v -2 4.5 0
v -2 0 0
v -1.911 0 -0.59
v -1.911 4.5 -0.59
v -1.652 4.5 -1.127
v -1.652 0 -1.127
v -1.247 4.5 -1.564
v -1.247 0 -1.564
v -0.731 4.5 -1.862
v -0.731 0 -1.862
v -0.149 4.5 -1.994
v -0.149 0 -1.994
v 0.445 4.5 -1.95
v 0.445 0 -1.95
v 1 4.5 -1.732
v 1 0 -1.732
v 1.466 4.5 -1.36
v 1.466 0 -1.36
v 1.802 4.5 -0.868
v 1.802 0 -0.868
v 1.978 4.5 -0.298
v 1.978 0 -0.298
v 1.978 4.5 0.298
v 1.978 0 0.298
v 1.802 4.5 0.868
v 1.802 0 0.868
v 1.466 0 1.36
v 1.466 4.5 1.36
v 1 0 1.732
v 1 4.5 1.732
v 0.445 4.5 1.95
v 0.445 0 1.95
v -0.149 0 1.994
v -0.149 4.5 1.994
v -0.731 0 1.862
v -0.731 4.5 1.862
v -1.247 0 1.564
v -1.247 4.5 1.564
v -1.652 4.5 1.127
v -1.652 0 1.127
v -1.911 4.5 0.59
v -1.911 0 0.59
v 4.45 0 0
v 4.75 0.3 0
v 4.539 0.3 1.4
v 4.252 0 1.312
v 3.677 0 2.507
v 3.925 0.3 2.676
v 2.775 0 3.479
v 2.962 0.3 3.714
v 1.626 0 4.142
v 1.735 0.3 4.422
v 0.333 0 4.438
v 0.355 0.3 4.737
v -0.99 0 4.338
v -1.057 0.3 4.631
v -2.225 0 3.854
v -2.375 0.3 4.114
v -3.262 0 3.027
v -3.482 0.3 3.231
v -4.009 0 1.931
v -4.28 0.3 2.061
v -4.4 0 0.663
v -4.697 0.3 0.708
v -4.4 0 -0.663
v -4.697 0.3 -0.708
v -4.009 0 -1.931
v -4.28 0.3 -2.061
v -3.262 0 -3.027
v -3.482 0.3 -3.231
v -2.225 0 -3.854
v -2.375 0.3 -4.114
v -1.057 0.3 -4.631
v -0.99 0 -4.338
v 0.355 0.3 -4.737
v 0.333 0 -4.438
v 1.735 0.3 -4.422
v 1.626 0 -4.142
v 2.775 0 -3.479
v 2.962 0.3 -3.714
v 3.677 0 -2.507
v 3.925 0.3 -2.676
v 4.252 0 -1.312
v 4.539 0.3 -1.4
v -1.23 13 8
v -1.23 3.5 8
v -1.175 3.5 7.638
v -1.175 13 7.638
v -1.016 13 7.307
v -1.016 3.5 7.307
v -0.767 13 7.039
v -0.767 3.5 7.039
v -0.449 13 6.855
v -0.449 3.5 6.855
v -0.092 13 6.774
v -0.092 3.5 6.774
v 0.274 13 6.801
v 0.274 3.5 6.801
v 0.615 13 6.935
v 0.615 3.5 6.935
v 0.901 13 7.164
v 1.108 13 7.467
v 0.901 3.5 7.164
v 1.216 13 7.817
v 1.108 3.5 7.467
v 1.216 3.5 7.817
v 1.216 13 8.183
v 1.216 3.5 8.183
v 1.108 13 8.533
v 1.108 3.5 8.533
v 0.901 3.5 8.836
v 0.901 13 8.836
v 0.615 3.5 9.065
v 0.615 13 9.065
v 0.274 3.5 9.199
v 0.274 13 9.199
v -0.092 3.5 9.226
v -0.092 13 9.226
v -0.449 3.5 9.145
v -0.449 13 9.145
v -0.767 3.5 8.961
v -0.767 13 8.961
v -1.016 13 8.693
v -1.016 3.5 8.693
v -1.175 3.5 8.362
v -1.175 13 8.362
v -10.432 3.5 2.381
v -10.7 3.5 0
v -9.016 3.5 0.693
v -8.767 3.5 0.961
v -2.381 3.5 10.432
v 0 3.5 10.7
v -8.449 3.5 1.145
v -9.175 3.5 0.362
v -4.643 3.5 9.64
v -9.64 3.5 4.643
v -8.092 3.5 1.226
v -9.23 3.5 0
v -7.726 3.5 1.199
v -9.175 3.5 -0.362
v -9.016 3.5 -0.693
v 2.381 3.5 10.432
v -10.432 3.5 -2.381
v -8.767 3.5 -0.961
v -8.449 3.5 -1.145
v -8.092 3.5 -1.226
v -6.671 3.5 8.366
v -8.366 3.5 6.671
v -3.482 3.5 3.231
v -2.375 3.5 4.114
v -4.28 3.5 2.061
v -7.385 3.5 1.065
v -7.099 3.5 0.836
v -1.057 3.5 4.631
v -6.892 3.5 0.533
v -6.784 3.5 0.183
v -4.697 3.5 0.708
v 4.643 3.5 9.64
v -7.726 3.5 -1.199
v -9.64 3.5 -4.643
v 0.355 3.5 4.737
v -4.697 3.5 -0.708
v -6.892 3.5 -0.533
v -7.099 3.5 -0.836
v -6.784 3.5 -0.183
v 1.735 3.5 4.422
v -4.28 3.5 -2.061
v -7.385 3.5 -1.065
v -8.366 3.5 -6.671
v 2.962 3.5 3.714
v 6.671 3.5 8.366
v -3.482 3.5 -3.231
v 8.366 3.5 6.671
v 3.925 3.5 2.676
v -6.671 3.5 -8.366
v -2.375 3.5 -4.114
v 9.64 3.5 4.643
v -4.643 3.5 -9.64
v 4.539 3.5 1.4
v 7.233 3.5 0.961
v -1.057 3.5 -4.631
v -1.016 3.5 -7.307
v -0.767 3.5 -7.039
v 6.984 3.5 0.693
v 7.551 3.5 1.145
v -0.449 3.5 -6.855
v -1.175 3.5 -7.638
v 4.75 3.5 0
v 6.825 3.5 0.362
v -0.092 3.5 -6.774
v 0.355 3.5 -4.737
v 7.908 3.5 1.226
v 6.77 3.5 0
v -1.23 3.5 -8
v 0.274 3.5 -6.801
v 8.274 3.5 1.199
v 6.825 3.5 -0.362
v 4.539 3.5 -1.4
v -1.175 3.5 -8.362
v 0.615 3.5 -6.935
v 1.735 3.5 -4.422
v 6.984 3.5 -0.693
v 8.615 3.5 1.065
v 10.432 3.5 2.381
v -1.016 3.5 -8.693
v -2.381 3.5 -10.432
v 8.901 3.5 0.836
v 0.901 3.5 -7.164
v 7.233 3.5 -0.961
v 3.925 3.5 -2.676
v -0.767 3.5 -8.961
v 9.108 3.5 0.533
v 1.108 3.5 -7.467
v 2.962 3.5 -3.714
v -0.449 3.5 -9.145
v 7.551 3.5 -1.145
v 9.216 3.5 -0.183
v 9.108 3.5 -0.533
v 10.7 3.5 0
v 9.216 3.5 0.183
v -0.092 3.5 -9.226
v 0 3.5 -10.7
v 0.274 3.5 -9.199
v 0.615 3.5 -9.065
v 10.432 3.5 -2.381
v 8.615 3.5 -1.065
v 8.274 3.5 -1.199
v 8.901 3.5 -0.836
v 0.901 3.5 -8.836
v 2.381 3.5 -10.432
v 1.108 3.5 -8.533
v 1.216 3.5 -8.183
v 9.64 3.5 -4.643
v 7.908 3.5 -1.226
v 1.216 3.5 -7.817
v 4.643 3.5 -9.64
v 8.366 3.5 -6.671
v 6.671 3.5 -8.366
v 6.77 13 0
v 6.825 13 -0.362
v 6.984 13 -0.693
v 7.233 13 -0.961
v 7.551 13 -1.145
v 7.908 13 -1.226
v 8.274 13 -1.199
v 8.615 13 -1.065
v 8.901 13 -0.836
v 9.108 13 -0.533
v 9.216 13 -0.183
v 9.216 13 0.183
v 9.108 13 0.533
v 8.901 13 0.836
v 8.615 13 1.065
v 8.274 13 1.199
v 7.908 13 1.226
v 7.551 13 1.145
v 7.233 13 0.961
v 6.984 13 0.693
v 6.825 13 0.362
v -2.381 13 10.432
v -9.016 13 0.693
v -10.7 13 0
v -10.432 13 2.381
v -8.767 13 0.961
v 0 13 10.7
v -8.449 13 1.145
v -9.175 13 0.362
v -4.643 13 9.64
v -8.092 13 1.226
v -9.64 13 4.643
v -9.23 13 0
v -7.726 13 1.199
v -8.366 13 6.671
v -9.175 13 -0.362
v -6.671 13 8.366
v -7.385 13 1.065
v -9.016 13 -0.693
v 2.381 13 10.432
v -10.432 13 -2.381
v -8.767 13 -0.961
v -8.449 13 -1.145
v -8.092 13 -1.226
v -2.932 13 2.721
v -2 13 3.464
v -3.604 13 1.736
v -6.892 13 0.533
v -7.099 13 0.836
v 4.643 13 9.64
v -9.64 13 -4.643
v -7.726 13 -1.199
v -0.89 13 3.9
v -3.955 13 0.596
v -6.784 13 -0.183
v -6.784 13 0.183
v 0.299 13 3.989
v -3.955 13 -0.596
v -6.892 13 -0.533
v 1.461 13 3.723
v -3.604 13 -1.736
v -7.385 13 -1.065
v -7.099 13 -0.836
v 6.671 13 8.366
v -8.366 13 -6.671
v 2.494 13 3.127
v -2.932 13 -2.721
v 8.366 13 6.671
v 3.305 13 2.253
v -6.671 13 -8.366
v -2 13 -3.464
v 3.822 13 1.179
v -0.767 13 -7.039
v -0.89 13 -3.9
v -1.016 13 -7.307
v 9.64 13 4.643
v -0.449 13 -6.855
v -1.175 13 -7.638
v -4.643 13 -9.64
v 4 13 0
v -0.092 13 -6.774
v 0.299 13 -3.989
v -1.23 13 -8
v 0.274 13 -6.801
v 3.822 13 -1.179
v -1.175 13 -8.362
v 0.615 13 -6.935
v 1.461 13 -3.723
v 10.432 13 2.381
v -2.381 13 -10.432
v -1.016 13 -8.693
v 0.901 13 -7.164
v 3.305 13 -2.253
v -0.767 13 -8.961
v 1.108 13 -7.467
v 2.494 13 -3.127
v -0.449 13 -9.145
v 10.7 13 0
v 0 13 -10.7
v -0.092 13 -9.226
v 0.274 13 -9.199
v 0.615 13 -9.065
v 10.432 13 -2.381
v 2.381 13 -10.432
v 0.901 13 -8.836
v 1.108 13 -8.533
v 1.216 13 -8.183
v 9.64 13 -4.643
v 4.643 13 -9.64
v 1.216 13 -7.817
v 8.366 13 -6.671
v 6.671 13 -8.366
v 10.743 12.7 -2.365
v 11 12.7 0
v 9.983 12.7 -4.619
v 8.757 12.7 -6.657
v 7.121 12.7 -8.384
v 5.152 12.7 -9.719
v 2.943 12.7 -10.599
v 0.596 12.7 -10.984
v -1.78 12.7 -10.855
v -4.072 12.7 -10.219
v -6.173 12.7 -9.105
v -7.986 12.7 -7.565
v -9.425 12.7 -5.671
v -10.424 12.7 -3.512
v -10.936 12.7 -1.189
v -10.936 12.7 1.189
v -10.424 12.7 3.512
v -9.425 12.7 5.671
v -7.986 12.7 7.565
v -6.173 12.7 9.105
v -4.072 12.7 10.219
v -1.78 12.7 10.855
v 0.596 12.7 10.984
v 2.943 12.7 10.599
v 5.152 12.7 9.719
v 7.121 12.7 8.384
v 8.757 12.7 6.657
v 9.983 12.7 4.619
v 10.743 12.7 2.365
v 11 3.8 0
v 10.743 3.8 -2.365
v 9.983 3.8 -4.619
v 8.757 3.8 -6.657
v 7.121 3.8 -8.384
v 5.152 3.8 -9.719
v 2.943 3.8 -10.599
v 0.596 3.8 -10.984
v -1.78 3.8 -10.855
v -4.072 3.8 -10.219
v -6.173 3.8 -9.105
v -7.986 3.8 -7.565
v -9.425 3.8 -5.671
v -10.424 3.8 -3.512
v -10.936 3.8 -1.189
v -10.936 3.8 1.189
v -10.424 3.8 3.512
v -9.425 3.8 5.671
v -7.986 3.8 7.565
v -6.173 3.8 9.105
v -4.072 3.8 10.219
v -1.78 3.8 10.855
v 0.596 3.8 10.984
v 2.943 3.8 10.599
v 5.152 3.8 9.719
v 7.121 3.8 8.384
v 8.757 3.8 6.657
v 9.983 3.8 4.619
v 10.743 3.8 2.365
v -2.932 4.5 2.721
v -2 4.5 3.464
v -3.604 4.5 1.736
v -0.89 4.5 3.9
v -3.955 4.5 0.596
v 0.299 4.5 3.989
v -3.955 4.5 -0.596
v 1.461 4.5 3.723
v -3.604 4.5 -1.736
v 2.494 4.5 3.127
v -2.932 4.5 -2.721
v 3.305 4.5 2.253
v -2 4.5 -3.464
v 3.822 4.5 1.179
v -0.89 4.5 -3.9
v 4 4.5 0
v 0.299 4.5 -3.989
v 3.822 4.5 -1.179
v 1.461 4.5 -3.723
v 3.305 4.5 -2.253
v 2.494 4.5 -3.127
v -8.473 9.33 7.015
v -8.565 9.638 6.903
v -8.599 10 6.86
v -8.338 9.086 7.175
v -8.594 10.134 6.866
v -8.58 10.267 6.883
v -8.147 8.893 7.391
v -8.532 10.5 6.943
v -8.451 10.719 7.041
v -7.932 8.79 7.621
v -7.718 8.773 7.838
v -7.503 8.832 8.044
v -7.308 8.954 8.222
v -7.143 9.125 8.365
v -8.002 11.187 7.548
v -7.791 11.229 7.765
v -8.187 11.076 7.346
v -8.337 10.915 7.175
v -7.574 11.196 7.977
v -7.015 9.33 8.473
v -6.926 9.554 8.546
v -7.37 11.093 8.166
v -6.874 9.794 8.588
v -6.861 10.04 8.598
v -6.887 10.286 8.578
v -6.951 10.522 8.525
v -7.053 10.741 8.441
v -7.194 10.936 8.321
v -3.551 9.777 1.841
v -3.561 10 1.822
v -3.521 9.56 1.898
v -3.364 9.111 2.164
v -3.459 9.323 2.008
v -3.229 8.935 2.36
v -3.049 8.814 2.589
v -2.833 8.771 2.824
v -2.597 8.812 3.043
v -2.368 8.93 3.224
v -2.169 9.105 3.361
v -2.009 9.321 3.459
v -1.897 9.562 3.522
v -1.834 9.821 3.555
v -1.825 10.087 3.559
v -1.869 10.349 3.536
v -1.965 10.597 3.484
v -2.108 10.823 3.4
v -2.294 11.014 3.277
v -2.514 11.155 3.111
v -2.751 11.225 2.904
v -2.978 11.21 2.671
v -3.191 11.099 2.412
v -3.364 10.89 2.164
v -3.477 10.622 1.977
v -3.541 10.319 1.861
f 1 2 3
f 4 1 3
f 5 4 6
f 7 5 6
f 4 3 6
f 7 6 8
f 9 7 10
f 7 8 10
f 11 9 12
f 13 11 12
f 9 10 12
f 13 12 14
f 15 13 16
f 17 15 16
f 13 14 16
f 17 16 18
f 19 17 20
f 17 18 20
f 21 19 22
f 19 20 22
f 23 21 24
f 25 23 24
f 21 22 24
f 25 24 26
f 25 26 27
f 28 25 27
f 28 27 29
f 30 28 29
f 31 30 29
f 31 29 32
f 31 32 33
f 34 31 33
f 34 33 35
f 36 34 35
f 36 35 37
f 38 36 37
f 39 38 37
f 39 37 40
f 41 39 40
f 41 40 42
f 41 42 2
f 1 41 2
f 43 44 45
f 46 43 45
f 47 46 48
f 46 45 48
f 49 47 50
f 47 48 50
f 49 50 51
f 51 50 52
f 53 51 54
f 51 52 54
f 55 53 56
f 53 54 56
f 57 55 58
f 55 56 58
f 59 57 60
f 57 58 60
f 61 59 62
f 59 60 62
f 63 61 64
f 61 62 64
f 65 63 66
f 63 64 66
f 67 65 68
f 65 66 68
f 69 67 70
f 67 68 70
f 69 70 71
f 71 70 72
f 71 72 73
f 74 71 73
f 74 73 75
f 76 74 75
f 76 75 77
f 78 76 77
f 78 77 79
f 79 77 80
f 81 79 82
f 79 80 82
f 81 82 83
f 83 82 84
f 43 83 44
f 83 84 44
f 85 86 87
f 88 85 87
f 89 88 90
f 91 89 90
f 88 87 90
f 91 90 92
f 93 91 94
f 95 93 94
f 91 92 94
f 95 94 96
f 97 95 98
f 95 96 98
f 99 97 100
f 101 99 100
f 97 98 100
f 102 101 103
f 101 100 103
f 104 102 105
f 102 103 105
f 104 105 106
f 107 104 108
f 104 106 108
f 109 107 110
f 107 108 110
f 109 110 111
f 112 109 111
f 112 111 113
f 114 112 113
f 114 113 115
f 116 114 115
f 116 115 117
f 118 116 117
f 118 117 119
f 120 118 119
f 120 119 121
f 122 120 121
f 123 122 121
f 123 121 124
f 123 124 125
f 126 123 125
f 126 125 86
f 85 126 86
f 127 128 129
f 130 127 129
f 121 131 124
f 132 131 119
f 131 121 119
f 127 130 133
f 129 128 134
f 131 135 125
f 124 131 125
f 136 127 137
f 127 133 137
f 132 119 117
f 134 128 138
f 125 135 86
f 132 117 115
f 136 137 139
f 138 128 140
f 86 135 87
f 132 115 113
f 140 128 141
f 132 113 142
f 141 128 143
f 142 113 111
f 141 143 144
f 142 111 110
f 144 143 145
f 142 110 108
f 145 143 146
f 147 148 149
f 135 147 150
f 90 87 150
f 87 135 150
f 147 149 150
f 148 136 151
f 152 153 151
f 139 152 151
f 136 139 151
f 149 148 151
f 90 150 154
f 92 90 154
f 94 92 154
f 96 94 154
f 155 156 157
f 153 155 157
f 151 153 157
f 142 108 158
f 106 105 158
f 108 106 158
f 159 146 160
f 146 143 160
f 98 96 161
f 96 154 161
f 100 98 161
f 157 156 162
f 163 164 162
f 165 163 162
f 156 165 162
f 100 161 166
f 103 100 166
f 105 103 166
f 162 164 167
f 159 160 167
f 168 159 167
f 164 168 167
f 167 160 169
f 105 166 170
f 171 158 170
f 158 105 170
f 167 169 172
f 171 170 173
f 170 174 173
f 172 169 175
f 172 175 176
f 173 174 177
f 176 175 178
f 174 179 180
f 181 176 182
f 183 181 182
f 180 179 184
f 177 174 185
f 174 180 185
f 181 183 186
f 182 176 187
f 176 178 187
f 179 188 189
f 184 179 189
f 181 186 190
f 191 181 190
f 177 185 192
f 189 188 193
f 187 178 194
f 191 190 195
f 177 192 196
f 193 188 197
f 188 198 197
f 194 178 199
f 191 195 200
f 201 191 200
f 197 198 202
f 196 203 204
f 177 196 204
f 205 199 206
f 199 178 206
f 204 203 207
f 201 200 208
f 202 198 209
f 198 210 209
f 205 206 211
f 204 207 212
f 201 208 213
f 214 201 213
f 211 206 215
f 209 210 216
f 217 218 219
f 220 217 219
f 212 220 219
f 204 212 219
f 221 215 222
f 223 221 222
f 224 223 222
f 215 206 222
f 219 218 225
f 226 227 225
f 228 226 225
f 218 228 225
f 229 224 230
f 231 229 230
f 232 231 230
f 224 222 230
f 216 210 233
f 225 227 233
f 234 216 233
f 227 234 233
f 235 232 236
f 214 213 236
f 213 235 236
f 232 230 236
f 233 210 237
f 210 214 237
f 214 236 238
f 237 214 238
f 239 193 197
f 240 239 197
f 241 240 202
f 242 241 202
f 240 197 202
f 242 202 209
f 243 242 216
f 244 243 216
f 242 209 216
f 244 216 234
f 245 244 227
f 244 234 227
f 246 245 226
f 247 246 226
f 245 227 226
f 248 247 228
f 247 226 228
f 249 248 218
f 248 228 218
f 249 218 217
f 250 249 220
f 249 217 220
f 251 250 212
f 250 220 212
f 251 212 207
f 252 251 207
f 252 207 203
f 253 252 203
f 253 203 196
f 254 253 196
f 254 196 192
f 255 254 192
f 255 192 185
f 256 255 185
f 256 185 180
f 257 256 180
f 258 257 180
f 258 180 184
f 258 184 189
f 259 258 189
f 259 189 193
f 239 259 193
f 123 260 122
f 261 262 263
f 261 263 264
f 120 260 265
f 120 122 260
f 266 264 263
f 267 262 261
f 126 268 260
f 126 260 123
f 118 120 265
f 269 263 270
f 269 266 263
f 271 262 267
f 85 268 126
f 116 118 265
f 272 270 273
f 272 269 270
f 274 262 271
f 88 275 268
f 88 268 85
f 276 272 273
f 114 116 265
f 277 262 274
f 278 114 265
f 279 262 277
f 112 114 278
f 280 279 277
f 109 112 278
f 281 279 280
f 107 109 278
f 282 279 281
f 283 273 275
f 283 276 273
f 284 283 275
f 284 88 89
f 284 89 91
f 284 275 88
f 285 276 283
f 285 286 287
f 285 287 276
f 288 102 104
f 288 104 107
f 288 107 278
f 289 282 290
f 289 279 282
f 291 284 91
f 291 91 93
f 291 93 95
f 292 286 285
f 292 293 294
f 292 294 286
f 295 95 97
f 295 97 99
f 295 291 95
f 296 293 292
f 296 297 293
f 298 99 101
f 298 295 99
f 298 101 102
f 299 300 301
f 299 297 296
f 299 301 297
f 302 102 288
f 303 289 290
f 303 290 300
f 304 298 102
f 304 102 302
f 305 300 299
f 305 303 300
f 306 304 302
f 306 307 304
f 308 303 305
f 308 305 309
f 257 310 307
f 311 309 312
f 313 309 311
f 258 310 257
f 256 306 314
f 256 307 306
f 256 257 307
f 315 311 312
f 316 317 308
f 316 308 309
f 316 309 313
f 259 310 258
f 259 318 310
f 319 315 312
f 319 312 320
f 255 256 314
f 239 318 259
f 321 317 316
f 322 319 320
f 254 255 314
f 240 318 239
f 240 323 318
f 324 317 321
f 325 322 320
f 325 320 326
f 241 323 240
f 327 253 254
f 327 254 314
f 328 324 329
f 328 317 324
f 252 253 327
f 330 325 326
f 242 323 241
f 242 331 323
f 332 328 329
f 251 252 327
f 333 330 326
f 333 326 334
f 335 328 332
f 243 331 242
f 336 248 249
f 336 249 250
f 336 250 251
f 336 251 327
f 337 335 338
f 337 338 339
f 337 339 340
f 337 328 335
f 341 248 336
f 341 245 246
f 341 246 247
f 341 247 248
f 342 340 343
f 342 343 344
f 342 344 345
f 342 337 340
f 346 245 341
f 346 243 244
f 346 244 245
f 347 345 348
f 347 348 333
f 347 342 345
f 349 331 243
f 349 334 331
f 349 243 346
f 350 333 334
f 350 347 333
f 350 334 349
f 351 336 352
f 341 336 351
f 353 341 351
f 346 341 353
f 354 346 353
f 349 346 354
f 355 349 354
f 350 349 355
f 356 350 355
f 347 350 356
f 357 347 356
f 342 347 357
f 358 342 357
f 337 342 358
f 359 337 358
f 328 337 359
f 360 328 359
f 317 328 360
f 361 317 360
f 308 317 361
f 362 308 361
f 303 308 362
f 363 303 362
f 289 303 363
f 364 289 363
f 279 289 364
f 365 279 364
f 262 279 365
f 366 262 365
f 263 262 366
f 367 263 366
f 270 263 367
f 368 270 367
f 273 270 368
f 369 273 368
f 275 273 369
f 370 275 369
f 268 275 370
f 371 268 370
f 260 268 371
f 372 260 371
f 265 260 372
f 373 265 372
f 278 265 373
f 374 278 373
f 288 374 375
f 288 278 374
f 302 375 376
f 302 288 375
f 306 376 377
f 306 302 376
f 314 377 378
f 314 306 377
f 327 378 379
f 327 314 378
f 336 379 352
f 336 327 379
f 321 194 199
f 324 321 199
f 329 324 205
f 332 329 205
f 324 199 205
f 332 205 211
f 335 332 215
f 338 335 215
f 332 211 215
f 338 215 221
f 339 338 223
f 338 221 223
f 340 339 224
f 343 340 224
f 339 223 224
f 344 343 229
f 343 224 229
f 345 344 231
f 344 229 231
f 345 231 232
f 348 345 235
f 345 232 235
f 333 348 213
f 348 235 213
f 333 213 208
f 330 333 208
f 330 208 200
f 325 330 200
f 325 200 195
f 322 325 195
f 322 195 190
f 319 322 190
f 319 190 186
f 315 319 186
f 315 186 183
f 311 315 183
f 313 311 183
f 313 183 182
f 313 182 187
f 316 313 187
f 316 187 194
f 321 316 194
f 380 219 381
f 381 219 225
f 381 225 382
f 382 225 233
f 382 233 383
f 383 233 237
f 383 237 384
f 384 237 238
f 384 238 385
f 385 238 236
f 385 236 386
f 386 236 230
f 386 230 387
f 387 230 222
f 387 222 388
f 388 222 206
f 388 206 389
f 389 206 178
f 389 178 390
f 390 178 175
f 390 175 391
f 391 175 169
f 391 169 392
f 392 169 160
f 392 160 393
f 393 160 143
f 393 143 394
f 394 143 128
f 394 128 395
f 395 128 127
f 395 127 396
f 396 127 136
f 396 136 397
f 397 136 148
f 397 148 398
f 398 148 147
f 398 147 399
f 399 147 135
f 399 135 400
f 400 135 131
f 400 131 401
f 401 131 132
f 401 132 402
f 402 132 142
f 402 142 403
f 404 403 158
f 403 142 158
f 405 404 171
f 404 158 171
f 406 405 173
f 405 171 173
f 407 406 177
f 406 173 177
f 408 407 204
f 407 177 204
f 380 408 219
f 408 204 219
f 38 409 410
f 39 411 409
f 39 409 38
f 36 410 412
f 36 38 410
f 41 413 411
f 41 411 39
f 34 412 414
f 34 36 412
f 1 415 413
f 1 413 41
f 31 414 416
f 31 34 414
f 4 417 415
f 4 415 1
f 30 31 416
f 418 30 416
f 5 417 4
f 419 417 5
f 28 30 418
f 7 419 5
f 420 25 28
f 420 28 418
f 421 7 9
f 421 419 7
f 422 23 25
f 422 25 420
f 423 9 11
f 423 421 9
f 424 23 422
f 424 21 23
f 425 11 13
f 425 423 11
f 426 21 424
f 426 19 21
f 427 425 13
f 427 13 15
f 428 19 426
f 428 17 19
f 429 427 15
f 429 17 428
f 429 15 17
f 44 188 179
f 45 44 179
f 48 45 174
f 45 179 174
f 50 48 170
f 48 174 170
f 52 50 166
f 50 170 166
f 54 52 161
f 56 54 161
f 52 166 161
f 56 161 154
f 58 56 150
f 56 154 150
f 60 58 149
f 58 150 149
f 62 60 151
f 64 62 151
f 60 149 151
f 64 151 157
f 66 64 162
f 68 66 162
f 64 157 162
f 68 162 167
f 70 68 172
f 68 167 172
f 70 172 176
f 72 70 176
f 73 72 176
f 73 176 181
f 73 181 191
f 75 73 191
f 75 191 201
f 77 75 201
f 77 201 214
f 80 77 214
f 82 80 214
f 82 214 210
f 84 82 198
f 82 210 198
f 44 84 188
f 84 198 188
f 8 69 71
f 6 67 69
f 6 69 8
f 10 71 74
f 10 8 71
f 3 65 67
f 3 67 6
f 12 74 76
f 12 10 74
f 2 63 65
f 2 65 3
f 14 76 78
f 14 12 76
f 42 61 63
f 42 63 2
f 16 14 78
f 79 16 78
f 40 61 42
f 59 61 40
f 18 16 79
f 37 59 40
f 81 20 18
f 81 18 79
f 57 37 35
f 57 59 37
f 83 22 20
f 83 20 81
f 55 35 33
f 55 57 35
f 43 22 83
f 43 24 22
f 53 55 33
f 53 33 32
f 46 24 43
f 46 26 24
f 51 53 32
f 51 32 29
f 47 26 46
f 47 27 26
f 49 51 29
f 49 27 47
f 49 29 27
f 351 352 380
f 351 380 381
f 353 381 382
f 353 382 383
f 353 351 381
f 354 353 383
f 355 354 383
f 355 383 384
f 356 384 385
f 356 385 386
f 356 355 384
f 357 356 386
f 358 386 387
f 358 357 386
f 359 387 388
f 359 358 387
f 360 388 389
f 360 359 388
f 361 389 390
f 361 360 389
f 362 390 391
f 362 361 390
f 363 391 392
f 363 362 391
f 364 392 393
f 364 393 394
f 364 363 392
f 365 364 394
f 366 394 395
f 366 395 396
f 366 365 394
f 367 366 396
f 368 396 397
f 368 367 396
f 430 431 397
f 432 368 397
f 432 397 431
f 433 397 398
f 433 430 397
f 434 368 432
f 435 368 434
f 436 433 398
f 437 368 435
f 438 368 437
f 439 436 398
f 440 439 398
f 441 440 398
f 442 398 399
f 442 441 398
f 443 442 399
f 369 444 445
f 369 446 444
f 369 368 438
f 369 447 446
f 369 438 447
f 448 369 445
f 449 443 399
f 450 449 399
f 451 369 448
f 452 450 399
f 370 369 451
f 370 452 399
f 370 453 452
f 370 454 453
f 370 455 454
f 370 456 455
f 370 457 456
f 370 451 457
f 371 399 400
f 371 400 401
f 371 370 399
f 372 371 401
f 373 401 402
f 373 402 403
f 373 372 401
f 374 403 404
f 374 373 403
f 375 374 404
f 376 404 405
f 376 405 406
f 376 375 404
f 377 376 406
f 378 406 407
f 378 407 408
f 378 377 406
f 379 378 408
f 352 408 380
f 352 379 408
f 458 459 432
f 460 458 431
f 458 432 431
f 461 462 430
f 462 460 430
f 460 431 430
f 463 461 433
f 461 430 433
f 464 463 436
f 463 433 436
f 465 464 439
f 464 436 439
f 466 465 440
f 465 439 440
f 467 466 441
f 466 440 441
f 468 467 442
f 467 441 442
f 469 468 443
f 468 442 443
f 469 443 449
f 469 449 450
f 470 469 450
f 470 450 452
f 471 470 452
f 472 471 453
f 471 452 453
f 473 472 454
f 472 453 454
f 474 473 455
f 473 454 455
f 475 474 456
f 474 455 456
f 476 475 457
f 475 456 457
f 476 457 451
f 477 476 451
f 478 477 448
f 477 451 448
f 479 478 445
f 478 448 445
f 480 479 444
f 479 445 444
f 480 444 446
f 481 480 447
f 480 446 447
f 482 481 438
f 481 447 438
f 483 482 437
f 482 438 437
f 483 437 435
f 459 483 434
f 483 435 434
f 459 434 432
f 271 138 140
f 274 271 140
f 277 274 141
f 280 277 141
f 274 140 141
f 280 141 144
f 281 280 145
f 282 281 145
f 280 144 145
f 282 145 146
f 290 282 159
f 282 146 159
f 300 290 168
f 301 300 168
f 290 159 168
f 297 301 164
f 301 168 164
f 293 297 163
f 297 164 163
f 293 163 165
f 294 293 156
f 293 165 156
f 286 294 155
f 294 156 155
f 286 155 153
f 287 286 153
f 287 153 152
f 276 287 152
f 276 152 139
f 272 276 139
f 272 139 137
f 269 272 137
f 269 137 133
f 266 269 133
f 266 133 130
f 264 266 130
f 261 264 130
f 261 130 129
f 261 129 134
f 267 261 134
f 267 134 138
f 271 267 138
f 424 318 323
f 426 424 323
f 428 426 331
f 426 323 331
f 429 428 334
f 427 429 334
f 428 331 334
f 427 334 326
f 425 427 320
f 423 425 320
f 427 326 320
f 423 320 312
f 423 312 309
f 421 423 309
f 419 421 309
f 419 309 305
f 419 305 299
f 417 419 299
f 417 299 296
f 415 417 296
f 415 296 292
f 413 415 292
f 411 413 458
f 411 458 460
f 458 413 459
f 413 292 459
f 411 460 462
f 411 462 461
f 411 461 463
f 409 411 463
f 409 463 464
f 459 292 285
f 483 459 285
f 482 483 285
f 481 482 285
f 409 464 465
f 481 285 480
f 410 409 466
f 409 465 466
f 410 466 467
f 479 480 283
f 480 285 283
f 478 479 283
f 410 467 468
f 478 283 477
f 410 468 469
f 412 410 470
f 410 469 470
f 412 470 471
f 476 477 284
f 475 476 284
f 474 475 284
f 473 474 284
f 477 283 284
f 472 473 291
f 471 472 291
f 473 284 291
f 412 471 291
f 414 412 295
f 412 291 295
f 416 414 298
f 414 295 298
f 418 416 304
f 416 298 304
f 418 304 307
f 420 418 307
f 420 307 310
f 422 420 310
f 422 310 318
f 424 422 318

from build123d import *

# Parameters (mm, degrees)
SCHIZZO1_W                                           = 11
SCHIZZO1_H                                           = 9.5
SCHIZZO2_R                                           = 4.75
ESTRUSIONE_ESTRUSIONE1_DEPTH                         = 3.5
FORO_PER_VITE_M2_1_D                                 = 2.459
FORO_PER_VITE_M2_1_DEPTH                             = 13
FORO_LAMATO_PER_VITE_M3_5_A_TESTA_ESAGON_D           = 4
FORO_LAMATO_PER_VITE_M3_5_A_TESTA_ESAGON_DEPTH       = 13
FORO_LAMATO_PER_VITE_M3_5_A_TESTA_ESAGON_CBORE_D     = 8
FORO_LAMATO_PER_VITE_M3_5_A_TESTA_ESAGON_CBORE_DEPTH = 8.5
SCHIZZO7_W                                           = 1.2295
SCHIZZO7_H                                           = 11.749995321
SMUSSO1_SIZE                                         = 0.3


with BuildPart() as part:
    # Schizzo1 → Rivoluzione1 (revolve)
    with BuildSketch(Plane(origin=(0, 0, 0), x_dir=(-1, 0, 0), z_dir=(0, 0, -1))):
        with Locations((-5.5, 8.25)):
            Rectangle(SCHIZZO1_W, SCHIZZO1_H)
    revolve(axis=Axis((0, 3.5, 0), (0, 1, 0)))

    # Schizzo2 → Estrusione-Estrusione1 (add)
    with BuildSketch(Plane.XZ.offset(-3.5)):
        Circle(SCHIZZO2_R)
    extrude(amount=ESTRUSIONE_ESTRUSIONE1_DEPTH)

    # Foro per Vite M2-1
    with Locations(Plane(origin=(0, 13, 0), x_dir=(1, 0, 0), z_dir=(0, 1, 0))):
        with Locations((0, 8), (-8, 0), (0, -8), (8, 0)):
            Hole(FORO_PER_VITE_M2_1_D / 2, depth=FORO_PER_VITE_M2_1_DEPTH)

    # Foro lamato per Vite M3.5 a testa esagonale-1
    with Locations(Plane(origin=(0, 13, 0), x_dir=(1, 0, 0), z_dir=(0, 1, 0))):
        with Locations((0, 0)):
            CounterBoreHole(FORO_LAMATO_PER_VITE_M3_5_A_TESTA_ESAGON_D / 2, FORO_LAMATO_PER_VITE_M3_5_A_TESTA_ESAGON_CBORE_D / 2, FORO_LAMATO_PER_VITE_M3_5_A_TESTA_ESAGON_CBORE_DEPTH, depth=FORO_LAMATO_PER_VITE_M3_5_A_TESTA_ESAGON_DEPTH)

    # Schizzo7 → Foro per Vite M2-2 (revolve, cut)
    with BuildSketch(Plane(origin=(-2.69149863, 10, 2.69149863), x_dir=(-0.707106781, 0, -0.707106781), z_dir=(0, 1, 0))):
        with Locations((0.61475, 5.874997661)):
            Rectangle(SCHIZZO7_W, SCHIZZO7_H)
    revolve(axis=Axis((1.798629431, 10, -1.798629431), (-0.707106781, 0, 0.707106781)), mode=Mode.SUBTRACT)

    # Smusso1
    smusso1_edges = [part.edges().sort_by_distance(p)[0] for p in [
        (-11, 13, 0),
        (-11, 3.5, 0),
        (-4.75, 0, 0),
    ]]
    chamfer(smusso1_edges, length=SMUSSO1_SIZE)


solid = part.part
